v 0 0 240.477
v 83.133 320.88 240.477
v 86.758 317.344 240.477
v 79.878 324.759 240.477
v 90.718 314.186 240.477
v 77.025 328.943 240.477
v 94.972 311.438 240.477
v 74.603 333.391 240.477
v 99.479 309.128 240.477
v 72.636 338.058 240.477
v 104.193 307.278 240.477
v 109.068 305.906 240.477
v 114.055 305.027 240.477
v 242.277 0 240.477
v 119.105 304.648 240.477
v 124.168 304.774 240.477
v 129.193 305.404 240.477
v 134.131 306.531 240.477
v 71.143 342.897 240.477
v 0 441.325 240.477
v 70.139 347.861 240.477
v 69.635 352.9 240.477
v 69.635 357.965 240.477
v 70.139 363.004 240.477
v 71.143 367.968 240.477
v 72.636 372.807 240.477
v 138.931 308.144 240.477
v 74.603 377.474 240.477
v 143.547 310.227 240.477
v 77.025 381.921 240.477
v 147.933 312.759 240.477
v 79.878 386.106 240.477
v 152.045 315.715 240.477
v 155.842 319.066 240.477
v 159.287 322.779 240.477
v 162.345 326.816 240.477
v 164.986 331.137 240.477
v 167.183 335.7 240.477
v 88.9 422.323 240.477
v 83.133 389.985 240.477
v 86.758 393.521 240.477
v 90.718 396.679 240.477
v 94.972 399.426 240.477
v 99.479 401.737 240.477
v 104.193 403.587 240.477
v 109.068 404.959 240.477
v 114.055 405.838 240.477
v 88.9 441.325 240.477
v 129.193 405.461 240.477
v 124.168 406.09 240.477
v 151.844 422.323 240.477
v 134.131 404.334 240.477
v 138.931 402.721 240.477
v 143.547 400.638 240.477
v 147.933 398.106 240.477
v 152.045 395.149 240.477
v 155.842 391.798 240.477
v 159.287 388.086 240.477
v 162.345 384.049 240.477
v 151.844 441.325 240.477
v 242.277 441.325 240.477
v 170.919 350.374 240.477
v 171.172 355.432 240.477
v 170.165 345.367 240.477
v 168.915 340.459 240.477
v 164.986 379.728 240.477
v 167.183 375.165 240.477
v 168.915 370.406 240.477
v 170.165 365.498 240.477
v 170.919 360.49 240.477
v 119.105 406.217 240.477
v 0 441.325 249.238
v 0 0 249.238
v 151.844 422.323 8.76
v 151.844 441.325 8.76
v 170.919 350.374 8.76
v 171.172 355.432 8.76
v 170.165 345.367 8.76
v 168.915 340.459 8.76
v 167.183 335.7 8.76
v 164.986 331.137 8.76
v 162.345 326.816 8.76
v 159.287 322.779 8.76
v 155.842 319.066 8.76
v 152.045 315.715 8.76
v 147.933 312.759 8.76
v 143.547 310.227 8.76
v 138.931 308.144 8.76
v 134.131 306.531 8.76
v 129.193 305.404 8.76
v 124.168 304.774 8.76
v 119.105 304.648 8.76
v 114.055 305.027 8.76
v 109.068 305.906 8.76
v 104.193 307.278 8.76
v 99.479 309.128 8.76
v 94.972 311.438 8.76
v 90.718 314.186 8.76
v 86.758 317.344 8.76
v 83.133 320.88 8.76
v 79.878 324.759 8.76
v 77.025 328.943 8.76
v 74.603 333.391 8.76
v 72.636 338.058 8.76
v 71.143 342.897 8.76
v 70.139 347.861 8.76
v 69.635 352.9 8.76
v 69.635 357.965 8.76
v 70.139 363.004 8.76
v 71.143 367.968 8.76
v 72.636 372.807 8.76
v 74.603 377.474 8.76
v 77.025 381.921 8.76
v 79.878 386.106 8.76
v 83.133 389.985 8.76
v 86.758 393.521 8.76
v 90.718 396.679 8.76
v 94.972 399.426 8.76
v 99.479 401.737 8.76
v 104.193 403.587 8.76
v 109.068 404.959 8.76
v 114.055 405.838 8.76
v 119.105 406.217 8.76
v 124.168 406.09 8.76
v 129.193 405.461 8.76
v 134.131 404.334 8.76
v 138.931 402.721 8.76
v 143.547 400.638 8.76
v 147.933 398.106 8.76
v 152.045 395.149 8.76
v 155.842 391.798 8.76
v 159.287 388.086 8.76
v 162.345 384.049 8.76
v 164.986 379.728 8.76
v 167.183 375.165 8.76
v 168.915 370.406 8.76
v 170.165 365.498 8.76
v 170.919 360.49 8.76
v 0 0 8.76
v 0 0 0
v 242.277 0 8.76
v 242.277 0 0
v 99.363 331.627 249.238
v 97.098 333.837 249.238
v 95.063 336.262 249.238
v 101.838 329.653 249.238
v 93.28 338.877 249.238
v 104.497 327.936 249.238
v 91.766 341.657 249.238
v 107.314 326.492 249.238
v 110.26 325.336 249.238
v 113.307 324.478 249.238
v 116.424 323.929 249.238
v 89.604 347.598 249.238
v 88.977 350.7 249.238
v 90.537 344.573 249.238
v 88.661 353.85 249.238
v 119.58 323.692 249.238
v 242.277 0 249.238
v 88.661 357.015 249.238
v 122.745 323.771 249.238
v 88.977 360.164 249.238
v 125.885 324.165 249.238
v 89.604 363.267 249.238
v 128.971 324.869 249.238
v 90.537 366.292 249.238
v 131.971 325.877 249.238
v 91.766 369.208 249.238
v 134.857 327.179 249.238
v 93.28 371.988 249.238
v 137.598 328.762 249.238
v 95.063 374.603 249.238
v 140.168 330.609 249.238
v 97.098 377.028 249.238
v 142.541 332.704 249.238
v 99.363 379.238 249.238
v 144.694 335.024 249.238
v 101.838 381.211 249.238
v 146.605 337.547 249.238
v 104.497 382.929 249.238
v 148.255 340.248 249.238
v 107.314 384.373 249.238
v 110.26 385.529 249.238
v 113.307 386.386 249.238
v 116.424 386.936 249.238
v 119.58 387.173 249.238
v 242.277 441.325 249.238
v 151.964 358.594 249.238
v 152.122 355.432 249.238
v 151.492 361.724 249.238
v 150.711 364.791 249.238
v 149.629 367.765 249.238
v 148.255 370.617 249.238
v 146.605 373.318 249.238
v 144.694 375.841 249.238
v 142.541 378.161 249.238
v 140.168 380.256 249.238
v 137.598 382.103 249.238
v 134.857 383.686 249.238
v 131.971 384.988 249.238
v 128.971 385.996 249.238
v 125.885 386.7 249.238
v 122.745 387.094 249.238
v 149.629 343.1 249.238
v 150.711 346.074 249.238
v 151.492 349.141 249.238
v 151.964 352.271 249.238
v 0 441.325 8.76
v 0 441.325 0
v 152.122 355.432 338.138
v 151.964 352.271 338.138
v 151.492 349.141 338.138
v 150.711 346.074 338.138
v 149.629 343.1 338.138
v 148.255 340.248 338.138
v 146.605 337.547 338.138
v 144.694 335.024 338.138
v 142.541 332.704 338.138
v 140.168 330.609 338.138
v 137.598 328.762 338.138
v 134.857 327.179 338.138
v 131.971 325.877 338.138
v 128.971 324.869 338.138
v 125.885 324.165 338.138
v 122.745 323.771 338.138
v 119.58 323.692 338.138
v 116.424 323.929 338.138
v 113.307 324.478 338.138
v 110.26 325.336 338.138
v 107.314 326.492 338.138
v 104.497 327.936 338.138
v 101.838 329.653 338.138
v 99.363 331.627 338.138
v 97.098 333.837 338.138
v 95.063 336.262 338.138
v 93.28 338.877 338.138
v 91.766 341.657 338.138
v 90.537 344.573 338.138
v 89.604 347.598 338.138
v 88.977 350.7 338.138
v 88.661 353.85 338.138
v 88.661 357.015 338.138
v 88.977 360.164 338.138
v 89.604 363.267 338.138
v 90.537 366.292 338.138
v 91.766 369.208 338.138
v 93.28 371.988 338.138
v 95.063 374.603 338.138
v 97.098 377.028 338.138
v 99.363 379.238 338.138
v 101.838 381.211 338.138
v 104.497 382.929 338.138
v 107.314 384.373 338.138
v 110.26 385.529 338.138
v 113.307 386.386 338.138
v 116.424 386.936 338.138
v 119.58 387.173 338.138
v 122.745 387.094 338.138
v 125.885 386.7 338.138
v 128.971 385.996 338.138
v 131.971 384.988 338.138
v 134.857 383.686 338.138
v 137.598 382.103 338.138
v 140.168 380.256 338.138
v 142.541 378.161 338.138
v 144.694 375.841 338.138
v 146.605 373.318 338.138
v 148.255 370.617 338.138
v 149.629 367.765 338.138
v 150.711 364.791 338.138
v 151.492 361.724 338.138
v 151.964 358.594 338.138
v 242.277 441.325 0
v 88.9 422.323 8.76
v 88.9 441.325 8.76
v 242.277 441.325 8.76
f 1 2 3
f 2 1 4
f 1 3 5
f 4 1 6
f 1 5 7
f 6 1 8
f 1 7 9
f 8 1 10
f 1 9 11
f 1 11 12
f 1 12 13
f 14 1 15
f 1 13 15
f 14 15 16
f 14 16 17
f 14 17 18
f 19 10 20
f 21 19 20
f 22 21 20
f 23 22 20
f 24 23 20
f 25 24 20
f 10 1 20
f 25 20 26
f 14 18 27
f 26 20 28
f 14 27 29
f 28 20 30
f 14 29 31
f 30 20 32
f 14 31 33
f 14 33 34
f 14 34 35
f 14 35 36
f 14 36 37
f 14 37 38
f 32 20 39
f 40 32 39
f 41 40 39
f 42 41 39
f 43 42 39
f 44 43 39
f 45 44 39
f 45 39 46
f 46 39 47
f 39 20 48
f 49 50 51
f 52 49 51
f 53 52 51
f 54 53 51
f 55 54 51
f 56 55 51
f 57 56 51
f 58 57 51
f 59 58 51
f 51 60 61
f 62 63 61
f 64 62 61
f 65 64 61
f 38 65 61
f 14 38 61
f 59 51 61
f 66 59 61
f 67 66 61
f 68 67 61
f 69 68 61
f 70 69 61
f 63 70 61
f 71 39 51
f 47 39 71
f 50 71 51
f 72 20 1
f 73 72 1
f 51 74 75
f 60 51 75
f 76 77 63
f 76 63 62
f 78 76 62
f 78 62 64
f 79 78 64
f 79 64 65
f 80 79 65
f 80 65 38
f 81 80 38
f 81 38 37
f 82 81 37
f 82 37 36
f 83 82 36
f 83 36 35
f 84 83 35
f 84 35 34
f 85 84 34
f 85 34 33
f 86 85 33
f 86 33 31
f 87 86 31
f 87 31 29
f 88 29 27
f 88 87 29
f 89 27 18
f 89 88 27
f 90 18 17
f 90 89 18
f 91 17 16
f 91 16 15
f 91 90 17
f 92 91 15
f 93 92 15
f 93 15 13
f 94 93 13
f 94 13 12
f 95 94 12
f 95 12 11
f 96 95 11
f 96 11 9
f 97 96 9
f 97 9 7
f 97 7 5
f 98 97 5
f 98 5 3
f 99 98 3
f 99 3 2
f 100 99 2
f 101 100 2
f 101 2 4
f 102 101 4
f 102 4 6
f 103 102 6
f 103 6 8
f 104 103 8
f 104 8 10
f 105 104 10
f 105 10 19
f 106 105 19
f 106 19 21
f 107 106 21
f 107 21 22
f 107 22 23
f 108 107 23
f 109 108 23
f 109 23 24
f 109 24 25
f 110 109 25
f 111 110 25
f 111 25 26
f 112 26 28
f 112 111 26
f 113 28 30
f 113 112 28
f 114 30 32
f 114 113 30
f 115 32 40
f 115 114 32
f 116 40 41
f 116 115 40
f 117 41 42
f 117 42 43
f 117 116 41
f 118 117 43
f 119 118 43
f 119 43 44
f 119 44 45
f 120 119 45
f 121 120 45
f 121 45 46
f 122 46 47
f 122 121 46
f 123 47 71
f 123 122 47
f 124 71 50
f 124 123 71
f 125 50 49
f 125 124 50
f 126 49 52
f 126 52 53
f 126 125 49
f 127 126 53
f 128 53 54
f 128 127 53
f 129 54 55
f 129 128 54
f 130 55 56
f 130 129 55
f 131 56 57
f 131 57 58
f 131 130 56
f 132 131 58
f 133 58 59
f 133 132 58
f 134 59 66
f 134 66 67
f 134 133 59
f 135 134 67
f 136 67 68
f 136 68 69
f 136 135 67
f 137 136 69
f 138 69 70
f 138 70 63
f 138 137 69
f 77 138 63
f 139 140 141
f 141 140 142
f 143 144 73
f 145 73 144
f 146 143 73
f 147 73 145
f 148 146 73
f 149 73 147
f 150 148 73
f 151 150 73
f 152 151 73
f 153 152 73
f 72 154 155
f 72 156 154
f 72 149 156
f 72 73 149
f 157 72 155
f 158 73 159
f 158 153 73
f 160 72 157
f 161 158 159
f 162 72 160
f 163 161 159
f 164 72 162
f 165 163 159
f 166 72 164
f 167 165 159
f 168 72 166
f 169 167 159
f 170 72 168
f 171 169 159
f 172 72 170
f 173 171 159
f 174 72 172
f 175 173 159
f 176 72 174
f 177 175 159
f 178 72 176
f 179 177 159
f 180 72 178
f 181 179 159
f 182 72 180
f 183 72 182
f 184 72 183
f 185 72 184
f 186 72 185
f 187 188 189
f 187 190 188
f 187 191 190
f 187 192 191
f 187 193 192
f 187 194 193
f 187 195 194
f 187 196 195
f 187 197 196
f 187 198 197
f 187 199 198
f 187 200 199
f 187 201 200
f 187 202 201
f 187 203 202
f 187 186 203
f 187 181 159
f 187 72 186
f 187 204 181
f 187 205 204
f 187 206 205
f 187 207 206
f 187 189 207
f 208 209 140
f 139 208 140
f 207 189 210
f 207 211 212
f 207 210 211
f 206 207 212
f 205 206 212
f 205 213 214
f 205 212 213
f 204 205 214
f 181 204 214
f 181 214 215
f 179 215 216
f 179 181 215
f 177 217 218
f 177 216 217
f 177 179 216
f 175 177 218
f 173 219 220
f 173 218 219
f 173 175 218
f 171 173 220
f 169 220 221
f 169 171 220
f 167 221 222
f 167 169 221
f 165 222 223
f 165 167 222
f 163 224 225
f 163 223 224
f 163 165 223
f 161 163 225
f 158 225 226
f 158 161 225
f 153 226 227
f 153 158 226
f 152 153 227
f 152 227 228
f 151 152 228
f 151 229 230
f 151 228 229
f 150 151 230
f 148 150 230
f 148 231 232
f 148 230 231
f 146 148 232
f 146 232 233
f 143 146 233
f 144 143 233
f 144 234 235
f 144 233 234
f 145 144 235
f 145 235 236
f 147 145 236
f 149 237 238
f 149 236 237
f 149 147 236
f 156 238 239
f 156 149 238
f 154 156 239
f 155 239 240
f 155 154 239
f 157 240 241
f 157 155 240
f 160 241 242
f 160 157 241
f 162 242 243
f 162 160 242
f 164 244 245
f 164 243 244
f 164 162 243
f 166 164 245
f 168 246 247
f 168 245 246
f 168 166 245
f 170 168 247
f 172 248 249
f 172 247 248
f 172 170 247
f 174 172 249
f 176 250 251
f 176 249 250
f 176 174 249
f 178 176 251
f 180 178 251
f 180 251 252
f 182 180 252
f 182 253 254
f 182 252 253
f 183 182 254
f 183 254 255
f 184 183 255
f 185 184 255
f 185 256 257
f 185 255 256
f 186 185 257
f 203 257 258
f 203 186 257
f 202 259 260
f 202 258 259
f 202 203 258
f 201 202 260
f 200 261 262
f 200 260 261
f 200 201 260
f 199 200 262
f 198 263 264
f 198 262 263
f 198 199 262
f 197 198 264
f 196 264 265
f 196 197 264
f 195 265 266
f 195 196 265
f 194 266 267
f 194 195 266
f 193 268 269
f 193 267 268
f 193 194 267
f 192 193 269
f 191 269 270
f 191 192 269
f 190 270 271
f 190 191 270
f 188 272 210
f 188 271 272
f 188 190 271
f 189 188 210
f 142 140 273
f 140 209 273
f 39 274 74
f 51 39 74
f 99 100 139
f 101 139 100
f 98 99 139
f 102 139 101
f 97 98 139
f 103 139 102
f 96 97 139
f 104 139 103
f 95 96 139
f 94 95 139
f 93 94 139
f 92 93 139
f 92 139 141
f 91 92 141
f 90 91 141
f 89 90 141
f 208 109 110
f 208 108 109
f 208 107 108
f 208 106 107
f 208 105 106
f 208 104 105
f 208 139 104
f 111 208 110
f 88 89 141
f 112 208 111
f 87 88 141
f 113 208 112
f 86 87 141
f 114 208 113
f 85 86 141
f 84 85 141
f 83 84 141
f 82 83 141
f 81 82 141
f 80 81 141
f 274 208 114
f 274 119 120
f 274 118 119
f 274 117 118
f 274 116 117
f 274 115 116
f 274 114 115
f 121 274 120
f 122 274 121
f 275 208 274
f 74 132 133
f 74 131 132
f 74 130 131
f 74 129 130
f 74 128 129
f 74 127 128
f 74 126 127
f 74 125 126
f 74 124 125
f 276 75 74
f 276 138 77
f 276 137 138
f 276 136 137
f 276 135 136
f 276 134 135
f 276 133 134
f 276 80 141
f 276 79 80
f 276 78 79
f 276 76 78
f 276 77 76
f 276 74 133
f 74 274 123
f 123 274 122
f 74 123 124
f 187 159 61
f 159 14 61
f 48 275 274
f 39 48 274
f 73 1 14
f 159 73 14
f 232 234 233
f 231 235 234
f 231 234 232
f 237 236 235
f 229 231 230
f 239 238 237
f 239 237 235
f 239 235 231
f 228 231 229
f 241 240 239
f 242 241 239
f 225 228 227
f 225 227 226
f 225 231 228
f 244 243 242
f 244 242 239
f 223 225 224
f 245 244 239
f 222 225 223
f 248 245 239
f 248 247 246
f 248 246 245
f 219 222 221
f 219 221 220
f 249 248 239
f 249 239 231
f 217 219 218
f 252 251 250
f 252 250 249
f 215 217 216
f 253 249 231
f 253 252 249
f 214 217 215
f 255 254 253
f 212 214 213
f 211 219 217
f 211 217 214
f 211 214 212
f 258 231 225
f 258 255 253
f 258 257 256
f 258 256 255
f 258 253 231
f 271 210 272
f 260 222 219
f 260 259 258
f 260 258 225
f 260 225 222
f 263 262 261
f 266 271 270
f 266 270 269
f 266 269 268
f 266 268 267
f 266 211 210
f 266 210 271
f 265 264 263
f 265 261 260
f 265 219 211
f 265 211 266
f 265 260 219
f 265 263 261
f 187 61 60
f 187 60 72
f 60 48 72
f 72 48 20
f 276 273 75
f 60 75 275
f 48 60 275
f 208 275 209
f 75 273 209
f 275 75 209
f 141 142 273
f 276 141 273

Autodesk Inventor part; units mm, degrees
ref_plane "YZ Plane" through (0, 0, 0) normal (1, 0, 0) x (0, 1, 0)
ref_plane "XZ Plane" through (0, 0, 0) normal (0, 1, 0) x (-1, 0, 0)
ref_plane "XY Plane" through (0, 0, 0) normal (0, 0, 1) x (1, 0, 0)
sketch "Sketch1" plane through (0, 0, 0) normal (0, 0, 1) x (1, 0, 0)
  line L0 (0, 0) -> (242.2769, 0)
  line L1 (242.2769, 0) -> (242.2769, 441.325)
  line L2 (242.2769, 441.325) -> (0, 441.325)
  line L3 (0, 441.325) -> (0, 0)
  dimension "d0" = 242.2769
  dimension "d1" = 441.325
extrude "Extrusion1" add sketch "Sketch1" along normal blind 8.7605
sketch "Sketch2" plane through (0, 0, 8.7605) normal (0, 0, 1) x (1, 0, 0)
  line L0 (242.2769, 441.325) -> (0, 441.325) projected
  line L1 (0, 441.325) -> (88.9, 441.325)
  line L2 (88.9, 441.325) -> (88.9, 422.3233)
  line L3 (88.9, 422.3233) -> (151.8437, 422.3233)
  line L4 (151.8437, 422.3233) -> (151.8437, 441.325)
  dimension "d4" = 88.9
  dimension "d5" = 19.0017
  dimension "d6" = 62.9437
extrude "Extrusion2" add sketch "Sketch2" along normal blind 231.7166
sketch "Sketch3" plane through (0, 0, 240.477) normal (0, 0, 1) x (1, 0, 0)
  line L0 (88.9, 441.325) -> (88.9, 422.3233) projected
  line L1 (88.9, 422.3233) -> (151.8437, 422.3233) projected
  line L2 (151.8437, 422.3233) -> (151.8437, 441.325) projected
  line L3 (151.8437, 441.325) -> (88.9, 441.325) projected
  line L4 (88.9, 441.325) -> (0, 441.325) projected
  line L5 (151.8437, 441.325) -> (151.8437, 422.3233) projected
  line L6 (151.8437, 422.3233) -> (88.9, 422.3233) projected
  line L7 (88.9, 422.3233) -> (88.9, 441.325) projected
  line L8 (88.9, 441.325) -> (0, 441.325) projected
  line L9 (0, 441.325) -> (0, 0) projected
  line L10 (0, 0) -> (242.2769, 0) projected
  line L11 (242.2769, 0) -> (242.2769, 441.325) projected
  line L12 (242.2769, 441.325) -> (151.8437, 441.325) projected
extrude "Extrusion3" add sketch "Sketch3" along normal blind 8.7605
sketch "Sketch6" plane through (0, 0, 8.7605) normal (0, 0, 1) x (1, 0, 0)
  circle A0 centre (120.3719, 355.4324) radius 50.8
extrude "Extrusion4" add sketch "Sketch6" along normal blind 231.7166
sketch "Sketch7" plane through (0, 0, 249.2375) normal (0, 0, 1) x (1, 0, 0)
  circle A0 centre (120.3719, 355.4324) radius 50.8 projected
  circle A1 centre (120.3719, 355.4324) radius 31.75
  dimension "d15" = 63.5
extrude "Extrusion5" add sketch "Sketch7" along normal blind 88.9 contours A1
properties part number "Robotics ball launcher motor frame"
